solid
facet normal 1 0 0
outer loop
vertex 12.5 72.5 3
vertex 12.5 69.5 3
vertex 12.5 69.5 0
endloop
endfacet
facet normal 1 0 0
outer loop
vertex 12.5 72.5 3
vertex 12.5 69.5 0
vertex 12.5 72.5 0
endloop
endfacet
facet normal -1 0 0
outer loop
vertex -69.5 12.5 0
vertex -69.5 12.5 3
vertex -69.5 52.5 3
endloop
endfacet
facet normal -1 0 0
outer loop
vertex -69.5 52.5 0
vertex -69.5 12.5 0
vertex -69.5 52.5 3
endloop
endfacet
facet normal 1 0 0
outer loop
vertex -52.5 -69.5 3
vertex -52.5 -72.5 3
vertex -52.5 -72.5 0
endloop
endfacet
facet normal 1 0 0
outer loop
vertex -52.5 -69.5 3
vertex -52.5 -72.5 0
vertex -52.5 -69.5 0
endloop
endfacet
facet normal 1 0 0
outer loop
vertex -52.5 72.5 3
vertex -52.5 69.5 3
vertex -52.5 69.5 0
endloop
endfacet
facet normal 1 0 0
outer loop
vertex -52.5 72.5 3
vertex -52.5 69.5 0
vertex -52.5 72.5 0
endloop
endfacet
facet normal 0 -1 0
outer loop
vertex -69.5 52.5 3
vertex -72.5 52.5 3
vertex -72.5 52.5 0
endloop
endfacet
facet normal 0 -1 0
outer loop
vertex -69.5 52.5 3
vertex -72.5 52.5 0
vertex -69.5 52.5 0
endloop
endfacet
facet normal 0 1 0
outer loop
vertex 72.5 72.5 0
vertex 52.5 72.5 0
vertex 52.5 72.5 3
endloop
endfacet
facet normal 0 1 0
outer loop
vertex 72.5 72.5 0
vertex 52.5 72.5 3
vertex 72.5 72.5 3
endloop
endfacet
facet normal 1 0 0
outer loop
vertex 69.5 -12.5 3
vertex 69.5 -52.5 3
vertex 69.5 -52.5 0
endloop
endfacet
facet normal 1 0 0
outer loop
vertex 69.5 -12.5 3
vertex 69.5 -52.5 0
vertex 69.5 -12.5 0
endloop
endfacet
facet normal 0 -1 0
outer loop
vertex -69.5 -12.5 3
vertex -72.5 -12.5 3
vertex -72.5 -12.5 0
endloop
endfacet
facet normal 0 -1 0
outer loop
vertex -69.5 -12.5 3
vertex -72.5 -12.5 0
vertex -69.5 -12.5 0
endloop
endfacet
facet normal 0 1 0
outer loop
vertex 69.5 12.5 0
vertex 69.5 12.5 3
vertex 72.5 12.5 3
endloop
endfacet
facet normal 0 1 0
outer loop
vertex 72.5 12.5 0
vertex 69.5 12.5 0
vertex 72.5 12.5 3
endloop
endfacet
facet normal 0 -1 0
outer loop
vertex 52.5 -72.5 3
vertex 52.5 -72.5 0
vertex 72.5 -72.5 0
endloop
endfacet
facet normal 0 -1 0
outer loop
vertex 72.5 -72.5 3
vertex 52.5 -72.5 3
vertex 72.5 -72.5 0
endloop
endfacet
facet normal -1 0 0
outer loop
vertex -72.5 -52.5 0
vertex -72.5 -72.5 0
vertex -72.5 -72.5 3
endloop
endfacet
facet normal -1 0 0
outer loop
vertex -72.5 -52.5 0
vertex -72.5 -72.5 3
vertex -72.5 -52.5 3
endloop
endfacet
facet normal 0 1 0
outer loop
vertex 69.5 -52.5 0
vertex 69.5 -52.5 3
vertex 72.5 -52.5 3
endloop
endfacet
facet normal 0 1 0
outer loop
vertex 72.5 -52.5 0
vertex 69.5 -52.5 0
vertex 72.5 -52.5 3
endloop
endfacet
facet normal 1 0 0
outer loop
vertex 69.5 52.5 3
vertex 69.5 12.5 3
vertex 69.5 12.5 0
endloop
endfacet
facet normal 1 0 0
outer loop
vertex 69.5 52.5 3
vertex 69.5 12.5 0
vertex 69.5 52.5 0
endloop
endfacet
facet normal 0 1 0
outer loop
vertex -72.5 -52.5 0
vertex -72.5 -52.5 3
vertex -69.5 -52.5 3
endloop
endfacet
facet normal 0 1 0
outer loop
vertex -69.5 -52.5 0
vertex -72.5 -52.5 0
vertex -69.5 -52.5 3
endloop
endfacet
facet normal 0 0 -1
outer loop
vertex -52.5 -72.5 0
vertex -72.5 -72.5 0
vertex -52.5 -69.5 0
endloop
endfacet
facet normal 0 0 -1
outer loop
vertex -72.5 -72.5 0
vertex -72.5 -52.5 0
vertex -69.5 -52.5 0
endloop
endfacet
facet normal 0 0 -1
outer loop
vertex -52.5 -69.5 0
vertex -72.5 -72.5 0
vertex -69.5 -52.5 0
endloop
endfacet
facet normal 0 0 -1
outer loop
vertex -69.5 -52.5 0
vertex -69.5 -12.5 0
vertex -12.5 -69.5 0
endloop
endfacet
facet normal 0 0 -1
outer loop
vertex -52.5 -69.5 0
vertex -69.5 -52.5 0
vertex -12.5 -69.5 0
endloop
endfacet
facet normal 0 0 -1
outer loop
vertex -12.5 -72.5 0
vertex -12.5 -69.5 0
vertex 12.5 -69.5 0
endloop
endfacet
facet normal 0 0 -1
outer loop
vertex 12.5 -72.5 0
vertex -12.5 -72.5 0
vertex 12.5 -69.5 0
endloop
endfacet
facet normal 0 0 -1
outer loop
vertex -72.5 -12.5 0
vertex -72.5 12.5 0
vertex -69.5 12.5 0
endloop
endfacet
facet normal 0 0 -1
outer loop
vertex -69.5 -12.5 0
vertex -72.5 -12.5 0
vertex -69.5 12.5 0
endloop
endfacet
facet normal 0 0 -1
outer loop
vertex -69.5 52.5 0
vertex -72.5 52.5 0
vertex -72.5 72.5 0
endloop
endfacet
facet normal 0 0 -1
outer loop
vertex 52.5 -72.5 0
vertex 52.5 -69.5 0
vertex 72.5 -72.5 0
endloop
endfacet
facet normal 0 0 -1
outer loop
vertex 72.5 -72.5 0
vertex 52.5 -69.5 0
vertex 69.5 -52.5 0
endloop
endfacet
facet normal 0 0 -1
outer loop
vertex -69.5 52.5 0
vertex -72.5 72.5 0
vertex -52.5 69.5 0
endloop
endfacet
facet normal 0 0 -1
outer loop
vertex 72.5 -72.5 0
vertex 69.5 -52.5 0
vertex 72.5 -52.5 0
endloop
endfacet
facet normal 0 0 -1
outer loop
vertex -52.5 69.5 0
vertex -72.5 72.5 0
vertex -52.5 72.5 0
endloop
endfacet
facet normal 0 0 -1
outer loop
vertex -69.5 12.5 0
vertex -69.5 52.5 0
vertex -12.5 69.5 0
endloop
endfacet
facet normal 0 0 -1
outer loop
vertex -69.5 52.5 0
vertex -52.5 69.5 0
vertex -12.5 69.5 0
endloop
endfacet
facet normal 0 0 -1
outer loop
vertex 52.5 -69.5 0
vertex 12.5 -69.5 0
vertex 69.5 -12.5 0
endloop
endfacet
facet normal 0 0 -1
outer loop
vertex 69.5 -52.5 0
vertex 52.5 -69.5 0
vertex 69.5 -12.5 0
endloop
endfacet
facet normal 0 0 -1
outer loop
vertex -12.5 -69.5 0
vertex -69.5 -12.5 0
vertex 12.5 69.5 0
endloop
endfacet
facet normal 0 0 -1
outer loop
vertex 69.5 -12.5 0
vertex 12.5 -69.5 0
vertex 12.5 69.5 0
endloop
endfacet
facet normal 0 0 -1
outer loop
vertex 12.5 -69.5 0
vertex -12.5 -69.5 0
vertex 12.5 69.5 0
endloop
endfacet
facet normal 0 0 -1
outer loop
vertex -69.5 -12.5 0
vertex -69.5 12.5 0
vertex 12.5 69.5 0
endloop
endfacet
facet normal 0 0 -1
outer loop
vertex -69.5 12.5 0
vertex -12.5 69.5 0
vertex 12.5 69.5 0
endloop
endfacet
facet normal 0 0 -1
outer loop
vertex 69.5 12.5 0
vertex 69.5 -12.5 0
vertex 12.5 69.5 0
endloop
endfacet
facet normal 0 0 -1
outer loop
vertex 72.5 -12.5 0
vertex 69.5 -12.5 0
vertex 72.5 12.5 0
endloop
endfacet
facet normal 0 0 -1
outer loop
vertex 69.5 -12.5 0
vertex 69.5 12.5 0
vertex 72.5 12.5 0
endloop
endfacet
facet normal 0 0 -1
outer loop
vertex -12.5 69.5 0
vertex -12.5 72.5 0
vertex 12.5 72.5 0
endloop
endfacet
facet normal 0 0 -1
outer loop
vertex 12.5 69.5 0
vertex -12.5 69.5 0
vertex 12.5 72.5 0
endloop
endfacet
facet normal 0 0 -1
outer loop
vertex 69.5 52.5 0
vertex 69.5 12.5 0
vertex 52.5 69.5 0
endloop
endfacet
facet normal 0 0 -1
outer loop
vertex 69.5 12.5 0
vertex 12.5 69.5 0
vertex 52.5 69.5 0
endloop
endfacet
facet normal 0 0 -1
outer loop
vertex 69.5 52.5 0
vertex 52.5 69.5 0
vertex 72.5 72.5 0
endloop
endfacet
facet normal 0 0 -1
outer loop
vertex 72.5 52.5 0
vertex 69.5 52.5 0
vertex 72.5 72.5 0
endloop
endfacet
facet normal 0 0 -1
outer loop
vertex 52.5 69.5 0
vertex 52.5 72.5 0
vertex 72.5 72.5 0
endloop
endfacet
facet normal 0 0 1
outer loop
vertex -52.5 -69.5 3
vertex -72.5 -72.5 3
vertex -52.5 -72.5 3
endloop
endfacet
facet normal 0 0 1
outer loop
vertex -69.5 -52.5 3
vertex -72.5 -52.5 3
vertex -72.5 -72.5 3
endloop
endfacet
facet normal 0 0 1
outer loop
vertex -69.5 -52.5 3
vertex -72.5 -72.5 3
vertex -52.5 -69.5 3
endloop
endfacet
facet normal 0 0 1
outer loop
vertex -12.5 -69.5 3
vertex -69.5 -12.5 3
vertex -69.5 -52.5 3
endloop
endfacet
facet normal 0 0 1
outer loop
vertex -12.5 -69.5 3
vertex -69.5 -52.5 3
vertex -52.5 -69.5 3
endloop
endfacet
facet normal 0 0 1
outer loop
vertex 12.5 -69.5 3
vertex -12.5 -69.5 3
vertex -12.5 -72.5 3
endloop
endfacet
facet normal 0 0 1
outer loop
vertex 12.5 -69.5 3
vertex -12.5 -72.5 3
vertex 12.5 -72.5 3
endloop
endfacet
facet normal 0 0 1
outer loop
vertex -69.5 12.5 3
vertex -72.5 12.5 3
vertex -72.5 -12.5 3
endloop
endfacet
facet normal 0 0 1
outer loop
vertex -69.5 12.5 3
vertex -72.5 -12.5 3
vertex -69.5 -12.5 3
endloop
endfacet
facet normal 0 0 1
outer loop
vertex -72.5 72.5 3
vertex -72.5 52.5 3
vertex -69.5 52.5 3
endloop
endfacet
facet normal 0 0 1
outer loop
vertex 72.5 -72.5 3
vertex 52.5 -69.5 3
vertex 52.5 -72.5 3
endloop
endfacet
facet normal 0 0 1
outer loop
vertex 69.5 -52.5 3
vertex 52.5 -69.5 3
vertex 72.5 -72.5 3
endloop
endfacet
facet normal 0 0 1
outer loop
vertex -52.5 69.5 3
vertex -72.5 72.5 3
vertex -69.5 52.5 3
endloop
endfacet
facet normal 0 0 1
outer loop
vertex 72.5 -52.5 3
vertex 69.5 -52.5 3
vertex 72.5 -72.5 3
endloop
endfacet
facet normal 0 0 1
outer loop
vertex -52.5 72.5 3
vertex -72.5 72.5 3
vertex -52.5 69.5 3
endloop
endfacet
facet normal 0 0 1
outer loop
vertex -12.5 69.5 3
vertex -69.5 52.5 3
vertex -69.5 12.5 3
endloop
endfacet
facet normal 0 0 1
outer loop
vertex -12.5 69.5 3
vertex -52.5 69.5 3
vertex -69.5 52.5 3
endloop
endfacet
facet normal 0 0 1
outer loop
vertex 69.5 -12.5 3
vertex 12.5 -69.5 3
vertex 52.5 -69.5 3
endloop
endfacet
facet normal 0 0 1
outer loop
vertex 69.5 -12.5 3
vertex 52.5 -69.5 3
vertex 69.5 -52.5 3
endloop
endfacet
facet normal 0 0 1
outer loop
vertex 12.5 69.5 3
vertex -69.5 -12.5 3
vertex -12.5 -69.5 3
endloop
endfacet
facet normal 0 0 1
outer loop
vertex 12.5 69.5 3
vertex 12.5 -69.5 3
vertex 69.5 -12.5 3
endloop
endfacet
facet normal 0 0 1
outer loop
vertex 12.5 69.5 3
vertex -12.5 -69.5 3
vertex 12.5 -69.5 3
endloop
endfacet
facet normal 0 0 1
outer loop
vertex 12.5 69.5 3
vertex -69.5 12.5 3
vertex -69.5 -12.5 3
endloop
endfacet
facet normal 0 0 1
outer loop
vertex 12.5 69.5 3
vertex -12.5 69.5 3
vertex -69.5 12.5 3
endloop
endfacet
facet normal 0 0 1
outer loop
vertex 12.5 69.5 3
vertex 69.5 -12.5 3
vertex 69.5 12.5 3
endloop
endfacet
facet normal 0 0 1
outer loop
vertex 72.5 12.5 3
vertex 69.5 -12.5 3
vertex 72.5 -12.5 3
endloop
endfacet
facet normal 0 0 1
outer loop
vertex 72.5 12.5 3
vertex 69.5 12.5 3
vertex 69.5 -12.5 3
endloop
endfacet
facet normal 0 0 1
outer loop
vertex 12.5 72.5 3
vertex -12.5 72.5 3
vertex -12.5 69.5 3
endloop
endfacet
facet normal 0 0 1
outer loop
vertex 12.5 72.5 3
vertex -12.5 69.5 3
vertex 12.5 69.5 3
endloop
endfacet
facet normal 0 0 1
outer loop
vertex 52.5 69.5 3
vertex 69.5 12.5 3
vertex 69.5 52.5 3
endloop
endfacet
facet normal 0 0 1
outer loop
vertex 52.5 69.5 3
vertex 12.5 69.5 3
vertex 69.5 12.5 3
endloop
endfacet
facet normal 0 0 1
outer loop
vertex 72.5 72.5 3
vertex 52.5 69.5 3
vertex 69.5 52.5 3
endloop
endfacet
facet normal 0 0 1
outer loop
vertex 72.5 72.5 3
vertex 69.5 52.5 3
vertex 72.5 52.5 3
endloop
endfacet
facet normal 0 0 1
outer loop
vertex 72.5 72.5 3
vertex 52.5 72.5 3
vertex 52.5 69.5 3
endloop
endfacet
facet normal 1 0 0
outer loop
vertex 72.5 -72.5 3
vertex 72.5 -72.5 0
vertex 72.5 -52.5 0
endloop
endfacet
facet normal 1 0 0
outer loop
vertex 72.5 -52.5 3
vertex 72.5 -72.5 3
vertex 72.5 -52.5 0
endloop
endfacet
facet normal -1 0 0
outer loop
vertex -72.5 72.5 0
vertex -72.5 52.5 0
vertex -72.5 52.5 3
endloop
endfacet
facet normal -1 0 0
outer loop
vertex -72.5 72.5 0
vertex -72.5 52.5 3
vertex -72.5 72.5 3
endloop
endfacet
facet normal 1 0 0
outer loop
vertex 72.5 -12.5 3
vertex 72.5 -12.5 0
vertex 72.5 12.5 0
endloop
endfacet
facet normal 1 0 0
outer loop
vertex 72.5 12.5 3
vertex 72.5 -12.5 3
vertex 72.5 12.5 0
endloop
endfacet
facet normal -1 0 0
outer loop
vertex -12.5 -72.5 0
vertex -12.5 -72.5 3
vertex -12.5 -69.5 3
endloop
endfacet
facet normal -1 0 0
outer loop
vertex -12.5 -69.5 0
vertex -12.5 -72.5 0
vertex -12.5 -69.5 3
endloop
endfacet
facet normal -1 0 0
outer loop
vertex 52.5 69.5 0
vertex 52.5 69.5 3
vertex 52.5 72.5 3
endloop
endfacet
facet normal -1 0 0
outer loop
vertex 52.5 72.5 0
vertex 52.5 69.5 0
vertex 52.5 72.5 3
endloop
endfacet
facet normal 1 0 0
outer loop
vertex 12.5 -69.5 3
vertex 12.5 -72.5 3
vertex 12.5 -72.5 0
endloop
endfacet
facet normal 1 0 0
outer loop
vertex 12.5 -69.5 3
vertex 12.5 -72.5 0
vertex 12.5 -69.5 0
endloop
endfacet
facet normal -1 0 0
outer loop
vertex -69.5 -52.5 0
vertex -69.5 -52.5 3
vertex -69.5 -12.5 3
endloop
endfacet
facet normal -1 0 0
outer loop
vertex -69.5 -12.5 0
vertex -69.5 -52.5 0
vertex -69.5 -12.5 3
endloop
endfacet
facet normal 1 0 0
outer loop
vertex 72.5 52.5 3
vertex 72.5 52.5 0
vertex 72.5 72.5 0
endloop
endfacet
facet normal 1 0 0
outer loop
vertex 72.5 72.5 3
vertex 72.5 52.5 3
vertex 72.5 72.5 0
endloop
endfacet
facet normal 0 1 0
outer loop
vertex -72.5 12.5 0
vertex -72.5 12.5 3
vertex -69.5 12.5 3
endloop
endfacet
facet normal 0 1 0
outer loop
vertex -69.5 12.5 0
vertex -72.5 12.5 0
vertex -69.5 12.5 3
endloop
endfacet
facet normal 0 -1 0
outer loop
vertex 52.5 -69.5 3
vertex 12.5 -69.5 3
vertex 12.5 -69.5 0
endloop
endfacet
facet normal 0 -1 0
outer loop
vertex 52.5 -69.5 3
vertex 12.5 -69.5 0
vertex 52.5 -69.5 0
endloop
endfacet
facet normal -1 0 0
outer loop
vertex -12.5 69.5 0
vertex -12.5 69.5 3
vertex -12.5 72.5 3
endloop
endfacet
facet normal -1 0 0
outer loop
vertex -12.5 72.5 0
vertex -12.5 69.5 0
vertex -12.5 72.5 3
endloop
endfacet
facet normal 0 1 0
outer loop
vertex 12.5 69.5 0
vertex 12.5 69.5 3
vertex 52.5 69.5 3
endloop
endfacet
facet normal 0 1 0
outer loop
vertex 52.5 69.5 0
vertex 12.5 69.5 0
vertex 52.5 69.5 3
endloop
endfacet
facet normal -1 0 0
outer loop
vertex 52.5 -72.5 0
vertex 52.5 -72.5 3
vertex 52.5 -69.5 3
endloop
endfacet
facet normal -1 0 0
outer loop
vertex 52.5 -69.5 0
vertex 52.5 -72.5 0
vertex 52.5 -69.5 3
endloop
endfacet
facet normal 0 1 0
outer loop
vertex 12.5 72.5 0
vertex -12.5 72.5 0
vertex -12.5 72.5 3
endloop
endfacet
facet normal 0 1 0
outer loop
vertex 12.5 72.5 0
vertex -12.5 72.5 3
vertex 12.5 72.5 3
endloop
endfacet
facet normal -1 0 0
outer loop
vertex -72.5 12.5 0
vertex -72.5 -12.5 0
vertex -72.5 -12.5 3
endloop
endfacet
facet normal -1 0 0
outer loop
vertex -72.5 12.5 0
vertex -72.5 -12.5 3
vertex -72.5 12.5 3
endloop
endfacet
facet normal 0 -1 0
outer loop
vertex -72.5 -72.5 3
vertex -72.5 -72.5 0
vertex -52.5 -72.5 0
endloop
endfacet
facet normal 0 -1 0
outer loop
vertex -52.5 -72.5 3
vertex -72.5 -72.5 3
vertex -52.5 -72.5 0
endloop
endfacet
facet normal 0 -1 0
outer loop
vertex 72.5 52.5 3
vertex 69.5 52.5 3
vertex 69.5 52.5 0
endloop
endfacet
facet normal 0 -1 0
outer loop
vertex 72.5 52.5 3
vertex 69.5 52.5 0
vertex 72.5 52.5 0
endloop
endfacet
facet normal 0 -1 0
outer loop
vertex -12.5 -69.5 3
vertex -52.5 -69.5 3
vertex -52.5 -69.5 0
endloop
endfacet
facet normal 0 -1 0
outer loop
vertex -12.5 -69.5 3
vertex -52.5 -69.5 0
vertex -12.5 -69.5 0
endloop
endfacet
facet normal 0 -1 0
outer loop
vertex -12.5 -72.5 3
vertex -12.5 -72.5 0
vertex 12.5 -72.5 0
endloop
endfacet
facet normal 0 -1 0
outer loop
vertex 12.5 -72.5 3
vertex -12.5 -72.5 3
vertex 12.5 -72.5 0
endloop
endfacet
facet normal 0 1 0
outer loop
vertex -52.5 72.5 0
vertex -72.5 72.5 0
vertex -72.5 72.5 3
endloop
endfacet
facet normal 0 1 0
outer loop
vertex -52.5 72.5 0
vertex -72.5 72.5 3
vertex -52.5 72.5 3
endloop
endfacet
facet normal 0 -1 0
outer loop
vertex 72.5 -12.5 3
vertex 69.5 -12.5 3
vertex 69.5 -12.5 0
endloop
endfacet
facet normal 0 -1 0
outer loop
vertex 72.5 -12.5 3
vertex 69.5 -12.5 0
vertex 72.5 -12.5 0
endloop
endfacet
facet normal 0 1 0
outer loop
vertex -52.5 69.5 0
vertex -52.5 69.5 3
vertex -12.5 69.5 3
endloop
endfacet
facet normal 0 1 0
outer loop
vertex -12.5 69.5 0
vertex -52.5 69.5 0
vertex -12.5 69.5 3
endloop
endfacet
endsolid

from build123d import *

# Parameters (mm, degrees)
SKETCH1_W             = 145
SKETCH1_H             = 145
BOSS_EXTRUDE179_DEPTH = 3
SKETCH2_W             = 40
SKETCH2_H             = 3
SKETCH2_W_2           = 3
SKETCH2_H_2           = 40
CUT_EXTRUDE1_DEPTH    = 3


with BuildPart() as part:
    # Sketch1 → Boss-Extrude179 (new body)
    with BuildSketch(Plane.XY):
        Rectangle(SKETCH1_W, SKETCH1_H)
    extrude(amount=BOSS_EXTRUDE179_DEPTH)

    # Sketch2 → Cut-Extrude1 (cut)
    with BuildSketch(Plane.XY.offset(3)):
        with Locations((-32.5, 71)):
            Rectangle(SKETCH2_W, SKETCH2_H)
        with Locations((32.5, 71)):
            Rectangle(SKETCH2_W, SKETCH2_H)
        with Locations((-71, 32.5)):
            Rectangle(SKETCH2_W_2, SKETCH2_H_2)
        with Locations((-71, -32.5)):
            Rectangle(SKETCH2_W_2, SKETCH2_H_2)
        with Locations((32.5, -71)):
            Rectangle(SKETCH2_W, SKETCH2_H)
        with Locations((-32.5, -71)):
            Rectangle(SKETCH2_W, SKETCH2_H)
        with Locations((71, -32.5)):
            Rectangle(SKETCH2_W_2, SKETCH2_H_2)
        with Locations((71, 32.5)):
            Rectangle(SKETCH2_W_2, SKETCH2_H_2)
    extrude(amount=-CUT_EXTRUDE1_DEPTH, mode=Mode.SUBTRACT)


solid = part.part
